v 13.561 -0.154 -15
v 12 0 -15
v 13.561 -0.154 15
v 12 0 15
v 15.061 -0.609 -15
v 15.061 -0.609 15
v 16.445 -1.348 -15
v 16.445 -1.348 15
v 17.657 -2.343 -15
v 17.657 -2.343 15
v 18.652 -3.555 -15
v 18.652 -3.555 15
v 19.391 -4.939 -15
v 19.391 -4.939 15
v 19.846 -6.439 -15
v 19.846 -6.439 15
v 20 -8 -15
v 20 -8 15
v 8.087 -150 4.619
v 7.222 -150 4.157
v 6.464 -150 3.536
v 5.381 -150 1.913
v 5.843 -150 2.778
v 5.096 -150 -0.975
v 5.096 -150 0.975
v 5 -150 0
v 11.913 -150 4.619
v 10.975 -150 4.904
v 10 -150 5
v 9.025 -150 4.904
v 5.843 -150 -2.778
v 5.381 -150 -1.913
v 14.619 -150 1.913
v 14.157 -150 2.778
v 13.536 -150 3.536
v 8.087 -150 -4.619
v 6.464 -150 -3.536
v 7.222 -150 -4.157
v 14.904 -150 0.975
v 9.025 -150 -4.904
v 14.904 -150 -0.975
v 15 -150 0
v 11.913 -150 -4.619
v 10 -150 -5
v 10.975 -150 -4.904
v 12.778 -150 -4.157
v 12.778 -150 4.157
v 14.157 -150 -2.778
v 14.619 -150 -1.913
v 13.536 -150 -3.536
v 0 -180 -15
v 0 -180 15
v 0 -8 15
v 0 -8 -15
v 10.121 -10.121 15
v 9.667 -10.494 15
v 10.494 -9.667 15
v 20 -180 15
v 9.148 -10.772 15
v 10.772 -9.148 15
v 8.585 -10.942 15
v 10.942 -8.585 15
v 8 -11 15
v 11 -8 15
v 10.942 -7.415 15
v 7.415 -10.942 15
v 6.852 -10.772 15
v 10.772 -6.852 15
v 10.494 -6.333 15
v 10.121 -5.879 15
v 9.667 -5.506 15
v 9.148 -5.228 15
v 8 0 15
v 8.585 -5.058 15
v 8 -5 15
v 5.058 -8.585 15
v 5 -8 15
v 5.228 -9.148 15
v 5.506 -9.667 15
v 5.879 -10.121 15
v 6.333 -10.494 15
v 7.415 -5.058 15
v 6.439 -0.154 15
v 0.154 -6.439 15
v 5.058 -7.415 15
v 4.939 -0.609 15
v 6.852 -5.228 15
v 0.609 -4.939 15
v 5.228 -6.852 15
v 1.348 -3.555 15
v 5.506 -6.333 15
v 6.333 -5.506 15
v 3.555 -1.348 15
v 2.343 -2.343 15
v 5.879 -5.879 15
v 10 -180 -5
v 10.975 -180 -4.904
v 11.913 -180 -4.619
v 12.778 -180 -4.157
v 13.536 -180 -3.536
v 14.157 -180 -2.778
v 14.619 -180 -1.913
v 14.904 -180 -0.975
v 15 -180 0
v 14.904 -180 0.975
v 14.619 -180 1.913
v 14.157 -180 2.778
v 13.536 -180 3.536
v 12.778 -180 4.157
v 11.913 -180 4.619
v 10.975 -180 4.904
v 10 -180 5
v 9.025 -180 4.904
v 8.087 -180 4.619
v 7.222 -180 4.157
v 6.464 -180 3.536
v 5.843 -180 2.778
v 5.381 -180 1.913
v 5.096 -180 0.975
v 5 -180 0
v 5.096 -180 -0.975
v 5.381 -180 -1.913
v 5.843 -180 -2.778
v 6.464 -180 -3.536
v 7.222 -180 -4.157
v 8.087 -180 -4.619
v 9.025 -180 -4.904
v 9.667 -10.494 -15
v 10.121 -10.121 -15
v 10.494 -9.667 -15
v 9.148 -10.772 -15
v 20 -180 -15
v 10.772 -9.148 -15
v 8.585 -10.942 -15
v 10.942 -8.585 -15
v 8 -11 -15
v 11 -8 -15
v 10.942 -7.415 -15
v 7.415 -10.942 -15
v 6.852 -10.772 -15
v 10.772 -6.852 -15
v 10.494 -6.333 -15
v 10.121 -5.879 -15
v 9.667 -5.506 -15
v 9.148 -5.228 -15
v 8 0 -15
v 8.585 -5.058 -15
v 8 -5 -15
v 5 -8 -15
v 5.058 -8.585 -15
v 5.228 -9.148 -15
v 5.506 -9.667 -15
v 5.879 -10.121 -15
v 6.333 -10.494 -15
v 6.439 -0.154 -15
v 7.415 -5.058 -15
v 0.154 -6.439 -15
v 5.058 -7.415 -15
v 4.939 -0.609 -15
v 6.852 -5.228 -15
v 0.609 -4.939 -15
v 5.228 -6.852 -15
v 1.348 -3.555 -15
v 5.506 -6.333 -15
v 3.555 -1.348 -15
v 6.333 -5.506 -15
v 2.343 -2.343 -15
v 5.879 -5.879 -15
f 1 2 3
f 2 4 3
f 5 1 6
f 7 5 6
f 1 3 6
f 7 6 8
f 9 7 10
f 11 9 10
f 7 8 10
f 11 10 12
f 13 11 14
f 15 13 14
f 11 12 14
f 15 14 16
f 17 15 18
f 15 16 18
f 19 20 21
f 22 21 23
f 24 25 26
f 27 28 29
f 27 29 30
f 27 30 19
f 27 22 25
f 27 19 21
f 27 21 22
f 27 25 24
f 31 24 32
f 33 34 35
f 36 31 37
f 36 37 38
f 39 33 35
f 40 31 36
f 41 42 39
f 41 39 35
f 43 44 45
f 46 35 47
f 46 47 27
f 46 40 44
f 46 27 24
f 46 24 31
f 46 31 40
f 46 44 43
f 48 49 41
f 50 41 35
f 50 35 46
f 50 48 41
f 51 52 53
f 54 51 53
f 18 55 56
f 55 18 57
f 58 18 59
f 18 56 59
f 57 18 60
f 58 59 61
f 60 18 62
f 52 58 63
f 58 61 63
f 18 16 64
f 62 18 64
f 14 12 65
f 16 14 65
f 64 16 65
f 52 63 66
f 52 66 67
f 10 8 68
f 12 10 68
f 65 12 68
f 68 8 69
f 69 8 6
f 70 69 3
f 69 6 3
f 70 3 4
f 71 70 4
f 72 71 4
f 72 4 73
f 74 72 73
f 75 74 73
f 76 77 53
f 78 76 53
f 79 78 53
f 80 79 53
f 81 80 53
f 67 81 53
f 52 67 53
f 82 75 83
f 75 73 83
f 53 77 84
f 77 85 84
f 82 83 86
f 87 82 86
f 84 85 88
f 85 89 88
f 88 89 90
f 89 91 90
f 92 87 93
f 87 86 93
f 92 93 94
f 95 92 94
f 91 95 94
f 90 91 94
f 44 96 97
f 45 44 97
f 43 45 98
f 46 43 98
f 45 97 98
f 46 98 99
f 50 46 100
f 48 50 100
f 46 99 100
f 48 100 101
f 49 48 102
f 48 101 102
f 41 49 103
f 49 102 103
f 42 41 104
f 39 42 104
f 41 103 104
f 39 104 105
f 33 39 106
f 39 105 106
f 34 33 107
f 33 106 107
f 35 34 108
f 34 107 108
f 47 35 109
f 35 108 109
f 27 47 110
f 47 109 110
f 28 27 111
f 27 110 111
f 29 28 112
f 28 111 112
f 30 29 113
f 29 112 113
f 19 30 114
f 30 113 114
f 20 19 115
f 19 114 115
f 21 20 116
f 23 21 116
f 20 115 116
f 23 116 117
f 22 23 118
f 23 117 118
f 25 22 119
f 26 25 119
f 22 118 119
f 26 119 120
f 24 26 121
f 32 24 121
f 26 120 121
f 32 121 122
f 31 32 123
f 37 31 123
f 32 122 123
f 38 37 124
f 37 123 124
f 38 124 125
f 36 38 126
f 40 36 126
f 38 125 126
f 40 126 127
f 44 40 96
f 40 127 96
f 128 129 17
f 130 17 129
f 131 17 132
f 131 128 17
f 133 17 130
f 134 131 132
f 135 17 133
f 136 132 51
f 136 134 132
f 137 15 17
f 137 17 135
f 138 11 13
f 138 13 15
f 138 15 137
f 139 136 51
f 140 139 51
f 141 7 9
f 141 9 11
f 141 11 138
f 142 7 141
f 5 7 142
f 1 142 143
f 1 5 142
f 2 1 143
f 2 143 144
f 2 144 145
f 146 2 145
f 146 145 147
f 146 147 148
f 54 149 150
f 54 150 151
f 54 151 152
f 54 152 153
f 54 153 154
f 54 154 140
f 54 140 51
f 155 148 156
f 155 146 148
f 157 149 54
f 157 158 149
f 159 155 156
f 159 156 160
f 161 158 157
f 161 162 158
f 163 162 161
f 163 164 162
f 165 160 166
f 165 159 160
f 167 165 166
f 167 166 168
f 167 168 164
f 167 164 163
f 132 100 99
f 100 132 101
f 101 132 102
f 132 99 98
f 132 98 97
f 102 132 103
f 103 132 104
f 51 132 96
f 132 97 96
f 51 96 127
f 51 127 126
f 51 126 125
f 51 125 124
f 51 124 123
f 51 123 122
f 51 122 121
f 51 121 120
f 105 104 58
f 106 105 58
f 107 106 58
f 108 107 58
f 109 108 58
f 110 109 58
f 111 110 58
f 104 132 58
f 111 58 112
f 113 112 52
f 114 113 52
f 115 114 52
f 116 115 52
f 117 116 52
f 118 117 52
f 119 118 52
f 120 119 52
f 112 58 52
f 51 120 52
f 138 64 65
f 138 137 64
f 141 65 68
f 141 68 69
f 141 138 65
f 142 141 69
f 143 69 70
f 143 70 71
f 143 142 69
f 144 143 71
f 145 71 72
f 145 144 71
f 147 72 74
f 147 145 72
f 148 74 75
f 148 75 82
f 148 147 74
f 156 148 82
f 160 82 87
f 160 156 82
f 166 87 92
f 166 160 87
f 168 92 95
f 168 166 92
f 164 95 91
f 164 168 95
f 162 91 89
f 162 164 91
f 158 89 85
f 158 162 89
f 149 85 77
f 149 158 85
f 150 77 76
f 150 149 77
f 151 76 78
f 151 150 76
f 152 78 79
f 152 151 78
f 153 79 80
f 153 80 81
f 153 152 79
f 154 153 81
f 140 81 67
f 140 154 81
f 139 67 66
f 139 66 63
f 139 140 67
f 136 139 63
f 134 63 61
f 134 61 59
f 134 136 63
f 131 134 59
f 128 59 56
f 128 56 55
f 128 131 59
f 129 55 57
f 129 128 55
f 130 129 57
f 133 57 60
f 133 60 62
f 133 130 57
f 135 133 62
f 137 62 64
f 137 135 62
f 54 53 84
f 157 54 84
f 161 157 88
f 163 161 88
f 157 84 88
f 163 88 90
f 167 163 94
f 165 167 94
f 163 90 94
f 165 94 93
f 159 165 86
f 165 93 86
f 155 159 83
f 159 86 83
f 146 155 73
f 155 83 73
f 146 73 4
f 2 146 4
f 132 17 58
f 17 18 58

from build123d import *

# Parameters (mm, degrees)
SKETCH_1_R          = 3
EXTRUDE_1_DEPTH     = 15
SKETCH_2_R          = 5
CUT_EXTRUDE_1_DEPTH = 30


with BuildPart() as part:
    # 草图1 → 凸台-拉伸1 (new, symmetric)
    with BuildSketch(Plane.XY):
        with BuildLine():
            Line((8, 0), (12, 0))
            ThreePointArc((12, 0), (17.656854249, -2.343145751), (20, -8))
            Line((20, -8), (20, -180))
            Line((20, -180), (0, -180))
            Line((0, -180), (0, -8))
            ThreePointArc((0, -8), (2.343145751, -2.343145751), (8, 0))
        make_face()
        with Locations((8, -8)):
            Circle(SKETCH_1_R, mode=Mode.SUBTRACT)
    extrude(amount=EXTRUDE_1_DEPTH, both=True)

    # 草图2 → 切除-拉伸1 (cut)
    with BuildSketch(Plane.XZ.offset(180)):
        with Locations(Location((10, 0, 0), (0, 0, 270))):
            Circle(SKETCH_2_R)
    extrude(amount=-CUT_EXTRUDE_1_DEPTH, mode=Mode.SUBTRACT)


solid = part.part
